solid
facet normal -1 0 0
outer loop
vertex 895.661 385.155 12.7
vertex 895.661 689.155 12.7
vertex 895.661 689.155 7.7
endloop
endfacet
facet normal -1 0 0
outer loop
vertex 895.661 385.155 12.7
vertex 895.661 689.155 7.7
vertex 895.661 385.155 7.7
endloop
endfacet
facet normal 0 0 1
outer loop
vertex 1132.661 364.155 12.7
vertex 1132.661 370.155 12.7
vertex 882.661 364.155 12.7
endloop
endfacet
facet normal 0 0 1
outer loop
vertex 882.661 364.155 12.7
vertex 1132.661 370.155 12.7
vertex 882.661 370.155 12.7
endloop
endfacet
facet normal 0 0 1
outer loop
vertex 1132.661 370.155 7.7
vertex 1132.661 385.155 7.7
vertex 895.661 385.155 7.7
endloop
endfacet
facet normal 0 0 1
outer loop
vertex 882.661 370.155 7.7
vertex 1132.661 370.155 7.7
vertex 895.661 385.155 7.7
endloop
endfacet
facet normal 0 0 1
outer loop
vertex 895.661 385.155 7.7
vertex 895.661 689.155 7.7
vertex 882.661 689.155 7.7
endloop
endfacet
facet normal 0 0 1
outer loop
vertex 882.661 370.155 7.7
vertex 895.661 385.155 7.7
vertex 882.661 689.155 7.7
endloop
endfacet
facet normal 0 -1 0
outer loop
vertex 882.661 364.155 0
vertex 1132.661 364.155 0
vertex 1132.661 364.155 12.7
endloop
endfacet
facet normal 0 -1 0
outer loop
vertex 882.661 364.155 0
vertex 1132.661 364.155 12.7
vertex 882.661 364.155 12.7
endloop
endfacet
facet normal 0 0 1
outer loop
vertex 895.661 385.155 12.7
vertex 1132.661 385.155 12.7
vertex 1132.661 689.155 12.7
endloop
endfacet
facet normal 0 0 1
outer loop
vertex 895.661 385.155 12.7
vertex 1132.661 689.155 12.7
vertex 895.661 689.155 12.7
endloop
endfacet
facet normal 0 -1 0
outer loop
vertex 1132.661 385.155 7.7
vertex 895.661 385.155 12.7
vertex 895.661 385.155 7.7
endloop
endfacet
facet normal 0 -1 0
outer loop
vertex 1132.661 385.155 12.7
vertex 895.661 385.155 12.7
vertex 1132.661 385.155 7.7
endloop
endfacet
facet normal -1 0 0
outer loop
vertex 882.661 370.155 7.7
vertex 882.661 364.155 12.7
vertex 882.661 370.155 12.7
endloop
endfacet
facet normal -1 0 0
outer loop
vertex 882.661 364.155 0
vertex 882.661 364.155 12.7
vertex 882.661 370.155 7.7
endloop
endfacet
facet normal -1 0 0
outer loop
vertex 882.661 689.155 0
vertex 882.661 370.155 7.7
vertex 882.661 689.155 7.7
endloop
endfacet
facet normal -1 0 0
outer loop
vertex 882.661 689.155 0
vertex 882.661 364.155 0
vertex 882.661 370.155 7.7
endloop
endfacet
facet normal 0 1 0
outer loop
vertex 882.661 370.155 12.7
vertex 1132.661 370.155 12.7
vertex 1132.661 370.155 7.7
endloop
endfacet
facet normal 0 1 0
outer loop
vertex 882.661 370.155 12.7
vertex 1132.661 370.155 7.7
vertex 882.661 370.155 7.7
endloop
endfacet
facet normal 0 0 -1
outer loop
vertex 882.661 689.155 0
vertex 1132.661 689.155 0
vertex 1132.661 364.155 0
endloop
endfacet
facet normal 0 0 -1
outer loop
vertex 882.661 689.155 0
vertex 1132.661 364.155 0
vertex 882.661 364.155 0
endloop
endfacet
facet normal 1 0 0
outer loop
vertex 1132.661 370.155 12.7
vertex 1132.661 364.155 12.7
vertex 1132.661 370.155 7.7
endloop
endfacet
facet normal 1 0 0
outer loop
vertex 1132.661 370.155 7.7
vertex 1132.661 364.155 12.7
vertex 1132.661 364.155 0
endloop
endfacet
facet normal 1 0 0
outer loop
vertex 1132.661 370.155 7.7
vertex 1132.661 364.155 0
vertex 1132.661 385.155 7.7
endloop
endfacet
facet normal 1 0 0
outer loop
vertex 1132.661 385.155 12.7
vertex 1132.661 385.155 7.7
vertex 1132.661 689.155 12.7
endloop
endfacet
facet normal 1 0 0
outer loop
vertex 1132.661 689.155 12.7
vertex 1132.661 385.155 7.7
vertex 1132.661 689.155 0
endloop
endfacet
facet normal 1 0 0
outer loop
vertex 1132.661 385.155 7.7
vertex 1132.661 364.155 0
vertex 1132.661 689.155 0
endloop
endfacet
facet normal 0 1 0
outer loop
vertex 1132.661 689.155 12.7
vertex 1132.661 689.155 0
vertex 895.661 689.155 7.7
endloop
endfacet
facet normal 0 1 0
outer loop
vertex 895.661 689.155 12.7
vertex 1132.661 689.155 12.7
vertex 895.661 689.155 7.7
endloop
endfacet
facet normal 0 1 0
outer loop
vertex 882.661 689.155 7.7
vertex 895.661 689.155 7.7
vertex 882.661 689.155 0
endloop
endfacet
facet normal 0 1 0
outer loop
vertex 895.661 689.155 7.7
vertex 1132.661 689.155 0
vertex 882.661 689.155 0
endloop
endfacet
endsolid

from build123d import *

# Parameters (mm, degrees)
SKETCH006_W     = 250
SKETCH006_H     = 325
PAD005_DEPTH    = 12.7
POCKET001_DEPTH = 5


with BuildPart() as roof:
    # Sketch006 → Pad005 (new body)
    with BuildSketch(Plane.XY):
        with Locations((742.936954, 526.654633)):
            Rectangle(SKETCH006_W, SKETCH006_H)
    extrude(amount=PAD005_DEPTH)

    # Sketch007 (on Face6 of Pad005) → Pocket001 (cut)
    with BuildSketch(Plane.XY.offset(12.7)):
        Polygon((854.936954, 702.879578), (854.936954, 385.154633), (607.793213, 385.154633), (607.793213, 370.154633), (885.780701, 370.154633), (885.780701, 702.879578), align=None)
    extrude(amount=-POCKET001_DEPTH, mode=Mode.SUBTRACT)


with BuildPart() as model_roof_mirrored:
    # Mirror001: instance of Roof
    add(roof.part.mirror(Plane(origin=(875.298889, 692.274536, 0), x_dir=(0, 1, 0), z_dir=(-1, 0, 0))))


solid = model_roof_mirrored.part
